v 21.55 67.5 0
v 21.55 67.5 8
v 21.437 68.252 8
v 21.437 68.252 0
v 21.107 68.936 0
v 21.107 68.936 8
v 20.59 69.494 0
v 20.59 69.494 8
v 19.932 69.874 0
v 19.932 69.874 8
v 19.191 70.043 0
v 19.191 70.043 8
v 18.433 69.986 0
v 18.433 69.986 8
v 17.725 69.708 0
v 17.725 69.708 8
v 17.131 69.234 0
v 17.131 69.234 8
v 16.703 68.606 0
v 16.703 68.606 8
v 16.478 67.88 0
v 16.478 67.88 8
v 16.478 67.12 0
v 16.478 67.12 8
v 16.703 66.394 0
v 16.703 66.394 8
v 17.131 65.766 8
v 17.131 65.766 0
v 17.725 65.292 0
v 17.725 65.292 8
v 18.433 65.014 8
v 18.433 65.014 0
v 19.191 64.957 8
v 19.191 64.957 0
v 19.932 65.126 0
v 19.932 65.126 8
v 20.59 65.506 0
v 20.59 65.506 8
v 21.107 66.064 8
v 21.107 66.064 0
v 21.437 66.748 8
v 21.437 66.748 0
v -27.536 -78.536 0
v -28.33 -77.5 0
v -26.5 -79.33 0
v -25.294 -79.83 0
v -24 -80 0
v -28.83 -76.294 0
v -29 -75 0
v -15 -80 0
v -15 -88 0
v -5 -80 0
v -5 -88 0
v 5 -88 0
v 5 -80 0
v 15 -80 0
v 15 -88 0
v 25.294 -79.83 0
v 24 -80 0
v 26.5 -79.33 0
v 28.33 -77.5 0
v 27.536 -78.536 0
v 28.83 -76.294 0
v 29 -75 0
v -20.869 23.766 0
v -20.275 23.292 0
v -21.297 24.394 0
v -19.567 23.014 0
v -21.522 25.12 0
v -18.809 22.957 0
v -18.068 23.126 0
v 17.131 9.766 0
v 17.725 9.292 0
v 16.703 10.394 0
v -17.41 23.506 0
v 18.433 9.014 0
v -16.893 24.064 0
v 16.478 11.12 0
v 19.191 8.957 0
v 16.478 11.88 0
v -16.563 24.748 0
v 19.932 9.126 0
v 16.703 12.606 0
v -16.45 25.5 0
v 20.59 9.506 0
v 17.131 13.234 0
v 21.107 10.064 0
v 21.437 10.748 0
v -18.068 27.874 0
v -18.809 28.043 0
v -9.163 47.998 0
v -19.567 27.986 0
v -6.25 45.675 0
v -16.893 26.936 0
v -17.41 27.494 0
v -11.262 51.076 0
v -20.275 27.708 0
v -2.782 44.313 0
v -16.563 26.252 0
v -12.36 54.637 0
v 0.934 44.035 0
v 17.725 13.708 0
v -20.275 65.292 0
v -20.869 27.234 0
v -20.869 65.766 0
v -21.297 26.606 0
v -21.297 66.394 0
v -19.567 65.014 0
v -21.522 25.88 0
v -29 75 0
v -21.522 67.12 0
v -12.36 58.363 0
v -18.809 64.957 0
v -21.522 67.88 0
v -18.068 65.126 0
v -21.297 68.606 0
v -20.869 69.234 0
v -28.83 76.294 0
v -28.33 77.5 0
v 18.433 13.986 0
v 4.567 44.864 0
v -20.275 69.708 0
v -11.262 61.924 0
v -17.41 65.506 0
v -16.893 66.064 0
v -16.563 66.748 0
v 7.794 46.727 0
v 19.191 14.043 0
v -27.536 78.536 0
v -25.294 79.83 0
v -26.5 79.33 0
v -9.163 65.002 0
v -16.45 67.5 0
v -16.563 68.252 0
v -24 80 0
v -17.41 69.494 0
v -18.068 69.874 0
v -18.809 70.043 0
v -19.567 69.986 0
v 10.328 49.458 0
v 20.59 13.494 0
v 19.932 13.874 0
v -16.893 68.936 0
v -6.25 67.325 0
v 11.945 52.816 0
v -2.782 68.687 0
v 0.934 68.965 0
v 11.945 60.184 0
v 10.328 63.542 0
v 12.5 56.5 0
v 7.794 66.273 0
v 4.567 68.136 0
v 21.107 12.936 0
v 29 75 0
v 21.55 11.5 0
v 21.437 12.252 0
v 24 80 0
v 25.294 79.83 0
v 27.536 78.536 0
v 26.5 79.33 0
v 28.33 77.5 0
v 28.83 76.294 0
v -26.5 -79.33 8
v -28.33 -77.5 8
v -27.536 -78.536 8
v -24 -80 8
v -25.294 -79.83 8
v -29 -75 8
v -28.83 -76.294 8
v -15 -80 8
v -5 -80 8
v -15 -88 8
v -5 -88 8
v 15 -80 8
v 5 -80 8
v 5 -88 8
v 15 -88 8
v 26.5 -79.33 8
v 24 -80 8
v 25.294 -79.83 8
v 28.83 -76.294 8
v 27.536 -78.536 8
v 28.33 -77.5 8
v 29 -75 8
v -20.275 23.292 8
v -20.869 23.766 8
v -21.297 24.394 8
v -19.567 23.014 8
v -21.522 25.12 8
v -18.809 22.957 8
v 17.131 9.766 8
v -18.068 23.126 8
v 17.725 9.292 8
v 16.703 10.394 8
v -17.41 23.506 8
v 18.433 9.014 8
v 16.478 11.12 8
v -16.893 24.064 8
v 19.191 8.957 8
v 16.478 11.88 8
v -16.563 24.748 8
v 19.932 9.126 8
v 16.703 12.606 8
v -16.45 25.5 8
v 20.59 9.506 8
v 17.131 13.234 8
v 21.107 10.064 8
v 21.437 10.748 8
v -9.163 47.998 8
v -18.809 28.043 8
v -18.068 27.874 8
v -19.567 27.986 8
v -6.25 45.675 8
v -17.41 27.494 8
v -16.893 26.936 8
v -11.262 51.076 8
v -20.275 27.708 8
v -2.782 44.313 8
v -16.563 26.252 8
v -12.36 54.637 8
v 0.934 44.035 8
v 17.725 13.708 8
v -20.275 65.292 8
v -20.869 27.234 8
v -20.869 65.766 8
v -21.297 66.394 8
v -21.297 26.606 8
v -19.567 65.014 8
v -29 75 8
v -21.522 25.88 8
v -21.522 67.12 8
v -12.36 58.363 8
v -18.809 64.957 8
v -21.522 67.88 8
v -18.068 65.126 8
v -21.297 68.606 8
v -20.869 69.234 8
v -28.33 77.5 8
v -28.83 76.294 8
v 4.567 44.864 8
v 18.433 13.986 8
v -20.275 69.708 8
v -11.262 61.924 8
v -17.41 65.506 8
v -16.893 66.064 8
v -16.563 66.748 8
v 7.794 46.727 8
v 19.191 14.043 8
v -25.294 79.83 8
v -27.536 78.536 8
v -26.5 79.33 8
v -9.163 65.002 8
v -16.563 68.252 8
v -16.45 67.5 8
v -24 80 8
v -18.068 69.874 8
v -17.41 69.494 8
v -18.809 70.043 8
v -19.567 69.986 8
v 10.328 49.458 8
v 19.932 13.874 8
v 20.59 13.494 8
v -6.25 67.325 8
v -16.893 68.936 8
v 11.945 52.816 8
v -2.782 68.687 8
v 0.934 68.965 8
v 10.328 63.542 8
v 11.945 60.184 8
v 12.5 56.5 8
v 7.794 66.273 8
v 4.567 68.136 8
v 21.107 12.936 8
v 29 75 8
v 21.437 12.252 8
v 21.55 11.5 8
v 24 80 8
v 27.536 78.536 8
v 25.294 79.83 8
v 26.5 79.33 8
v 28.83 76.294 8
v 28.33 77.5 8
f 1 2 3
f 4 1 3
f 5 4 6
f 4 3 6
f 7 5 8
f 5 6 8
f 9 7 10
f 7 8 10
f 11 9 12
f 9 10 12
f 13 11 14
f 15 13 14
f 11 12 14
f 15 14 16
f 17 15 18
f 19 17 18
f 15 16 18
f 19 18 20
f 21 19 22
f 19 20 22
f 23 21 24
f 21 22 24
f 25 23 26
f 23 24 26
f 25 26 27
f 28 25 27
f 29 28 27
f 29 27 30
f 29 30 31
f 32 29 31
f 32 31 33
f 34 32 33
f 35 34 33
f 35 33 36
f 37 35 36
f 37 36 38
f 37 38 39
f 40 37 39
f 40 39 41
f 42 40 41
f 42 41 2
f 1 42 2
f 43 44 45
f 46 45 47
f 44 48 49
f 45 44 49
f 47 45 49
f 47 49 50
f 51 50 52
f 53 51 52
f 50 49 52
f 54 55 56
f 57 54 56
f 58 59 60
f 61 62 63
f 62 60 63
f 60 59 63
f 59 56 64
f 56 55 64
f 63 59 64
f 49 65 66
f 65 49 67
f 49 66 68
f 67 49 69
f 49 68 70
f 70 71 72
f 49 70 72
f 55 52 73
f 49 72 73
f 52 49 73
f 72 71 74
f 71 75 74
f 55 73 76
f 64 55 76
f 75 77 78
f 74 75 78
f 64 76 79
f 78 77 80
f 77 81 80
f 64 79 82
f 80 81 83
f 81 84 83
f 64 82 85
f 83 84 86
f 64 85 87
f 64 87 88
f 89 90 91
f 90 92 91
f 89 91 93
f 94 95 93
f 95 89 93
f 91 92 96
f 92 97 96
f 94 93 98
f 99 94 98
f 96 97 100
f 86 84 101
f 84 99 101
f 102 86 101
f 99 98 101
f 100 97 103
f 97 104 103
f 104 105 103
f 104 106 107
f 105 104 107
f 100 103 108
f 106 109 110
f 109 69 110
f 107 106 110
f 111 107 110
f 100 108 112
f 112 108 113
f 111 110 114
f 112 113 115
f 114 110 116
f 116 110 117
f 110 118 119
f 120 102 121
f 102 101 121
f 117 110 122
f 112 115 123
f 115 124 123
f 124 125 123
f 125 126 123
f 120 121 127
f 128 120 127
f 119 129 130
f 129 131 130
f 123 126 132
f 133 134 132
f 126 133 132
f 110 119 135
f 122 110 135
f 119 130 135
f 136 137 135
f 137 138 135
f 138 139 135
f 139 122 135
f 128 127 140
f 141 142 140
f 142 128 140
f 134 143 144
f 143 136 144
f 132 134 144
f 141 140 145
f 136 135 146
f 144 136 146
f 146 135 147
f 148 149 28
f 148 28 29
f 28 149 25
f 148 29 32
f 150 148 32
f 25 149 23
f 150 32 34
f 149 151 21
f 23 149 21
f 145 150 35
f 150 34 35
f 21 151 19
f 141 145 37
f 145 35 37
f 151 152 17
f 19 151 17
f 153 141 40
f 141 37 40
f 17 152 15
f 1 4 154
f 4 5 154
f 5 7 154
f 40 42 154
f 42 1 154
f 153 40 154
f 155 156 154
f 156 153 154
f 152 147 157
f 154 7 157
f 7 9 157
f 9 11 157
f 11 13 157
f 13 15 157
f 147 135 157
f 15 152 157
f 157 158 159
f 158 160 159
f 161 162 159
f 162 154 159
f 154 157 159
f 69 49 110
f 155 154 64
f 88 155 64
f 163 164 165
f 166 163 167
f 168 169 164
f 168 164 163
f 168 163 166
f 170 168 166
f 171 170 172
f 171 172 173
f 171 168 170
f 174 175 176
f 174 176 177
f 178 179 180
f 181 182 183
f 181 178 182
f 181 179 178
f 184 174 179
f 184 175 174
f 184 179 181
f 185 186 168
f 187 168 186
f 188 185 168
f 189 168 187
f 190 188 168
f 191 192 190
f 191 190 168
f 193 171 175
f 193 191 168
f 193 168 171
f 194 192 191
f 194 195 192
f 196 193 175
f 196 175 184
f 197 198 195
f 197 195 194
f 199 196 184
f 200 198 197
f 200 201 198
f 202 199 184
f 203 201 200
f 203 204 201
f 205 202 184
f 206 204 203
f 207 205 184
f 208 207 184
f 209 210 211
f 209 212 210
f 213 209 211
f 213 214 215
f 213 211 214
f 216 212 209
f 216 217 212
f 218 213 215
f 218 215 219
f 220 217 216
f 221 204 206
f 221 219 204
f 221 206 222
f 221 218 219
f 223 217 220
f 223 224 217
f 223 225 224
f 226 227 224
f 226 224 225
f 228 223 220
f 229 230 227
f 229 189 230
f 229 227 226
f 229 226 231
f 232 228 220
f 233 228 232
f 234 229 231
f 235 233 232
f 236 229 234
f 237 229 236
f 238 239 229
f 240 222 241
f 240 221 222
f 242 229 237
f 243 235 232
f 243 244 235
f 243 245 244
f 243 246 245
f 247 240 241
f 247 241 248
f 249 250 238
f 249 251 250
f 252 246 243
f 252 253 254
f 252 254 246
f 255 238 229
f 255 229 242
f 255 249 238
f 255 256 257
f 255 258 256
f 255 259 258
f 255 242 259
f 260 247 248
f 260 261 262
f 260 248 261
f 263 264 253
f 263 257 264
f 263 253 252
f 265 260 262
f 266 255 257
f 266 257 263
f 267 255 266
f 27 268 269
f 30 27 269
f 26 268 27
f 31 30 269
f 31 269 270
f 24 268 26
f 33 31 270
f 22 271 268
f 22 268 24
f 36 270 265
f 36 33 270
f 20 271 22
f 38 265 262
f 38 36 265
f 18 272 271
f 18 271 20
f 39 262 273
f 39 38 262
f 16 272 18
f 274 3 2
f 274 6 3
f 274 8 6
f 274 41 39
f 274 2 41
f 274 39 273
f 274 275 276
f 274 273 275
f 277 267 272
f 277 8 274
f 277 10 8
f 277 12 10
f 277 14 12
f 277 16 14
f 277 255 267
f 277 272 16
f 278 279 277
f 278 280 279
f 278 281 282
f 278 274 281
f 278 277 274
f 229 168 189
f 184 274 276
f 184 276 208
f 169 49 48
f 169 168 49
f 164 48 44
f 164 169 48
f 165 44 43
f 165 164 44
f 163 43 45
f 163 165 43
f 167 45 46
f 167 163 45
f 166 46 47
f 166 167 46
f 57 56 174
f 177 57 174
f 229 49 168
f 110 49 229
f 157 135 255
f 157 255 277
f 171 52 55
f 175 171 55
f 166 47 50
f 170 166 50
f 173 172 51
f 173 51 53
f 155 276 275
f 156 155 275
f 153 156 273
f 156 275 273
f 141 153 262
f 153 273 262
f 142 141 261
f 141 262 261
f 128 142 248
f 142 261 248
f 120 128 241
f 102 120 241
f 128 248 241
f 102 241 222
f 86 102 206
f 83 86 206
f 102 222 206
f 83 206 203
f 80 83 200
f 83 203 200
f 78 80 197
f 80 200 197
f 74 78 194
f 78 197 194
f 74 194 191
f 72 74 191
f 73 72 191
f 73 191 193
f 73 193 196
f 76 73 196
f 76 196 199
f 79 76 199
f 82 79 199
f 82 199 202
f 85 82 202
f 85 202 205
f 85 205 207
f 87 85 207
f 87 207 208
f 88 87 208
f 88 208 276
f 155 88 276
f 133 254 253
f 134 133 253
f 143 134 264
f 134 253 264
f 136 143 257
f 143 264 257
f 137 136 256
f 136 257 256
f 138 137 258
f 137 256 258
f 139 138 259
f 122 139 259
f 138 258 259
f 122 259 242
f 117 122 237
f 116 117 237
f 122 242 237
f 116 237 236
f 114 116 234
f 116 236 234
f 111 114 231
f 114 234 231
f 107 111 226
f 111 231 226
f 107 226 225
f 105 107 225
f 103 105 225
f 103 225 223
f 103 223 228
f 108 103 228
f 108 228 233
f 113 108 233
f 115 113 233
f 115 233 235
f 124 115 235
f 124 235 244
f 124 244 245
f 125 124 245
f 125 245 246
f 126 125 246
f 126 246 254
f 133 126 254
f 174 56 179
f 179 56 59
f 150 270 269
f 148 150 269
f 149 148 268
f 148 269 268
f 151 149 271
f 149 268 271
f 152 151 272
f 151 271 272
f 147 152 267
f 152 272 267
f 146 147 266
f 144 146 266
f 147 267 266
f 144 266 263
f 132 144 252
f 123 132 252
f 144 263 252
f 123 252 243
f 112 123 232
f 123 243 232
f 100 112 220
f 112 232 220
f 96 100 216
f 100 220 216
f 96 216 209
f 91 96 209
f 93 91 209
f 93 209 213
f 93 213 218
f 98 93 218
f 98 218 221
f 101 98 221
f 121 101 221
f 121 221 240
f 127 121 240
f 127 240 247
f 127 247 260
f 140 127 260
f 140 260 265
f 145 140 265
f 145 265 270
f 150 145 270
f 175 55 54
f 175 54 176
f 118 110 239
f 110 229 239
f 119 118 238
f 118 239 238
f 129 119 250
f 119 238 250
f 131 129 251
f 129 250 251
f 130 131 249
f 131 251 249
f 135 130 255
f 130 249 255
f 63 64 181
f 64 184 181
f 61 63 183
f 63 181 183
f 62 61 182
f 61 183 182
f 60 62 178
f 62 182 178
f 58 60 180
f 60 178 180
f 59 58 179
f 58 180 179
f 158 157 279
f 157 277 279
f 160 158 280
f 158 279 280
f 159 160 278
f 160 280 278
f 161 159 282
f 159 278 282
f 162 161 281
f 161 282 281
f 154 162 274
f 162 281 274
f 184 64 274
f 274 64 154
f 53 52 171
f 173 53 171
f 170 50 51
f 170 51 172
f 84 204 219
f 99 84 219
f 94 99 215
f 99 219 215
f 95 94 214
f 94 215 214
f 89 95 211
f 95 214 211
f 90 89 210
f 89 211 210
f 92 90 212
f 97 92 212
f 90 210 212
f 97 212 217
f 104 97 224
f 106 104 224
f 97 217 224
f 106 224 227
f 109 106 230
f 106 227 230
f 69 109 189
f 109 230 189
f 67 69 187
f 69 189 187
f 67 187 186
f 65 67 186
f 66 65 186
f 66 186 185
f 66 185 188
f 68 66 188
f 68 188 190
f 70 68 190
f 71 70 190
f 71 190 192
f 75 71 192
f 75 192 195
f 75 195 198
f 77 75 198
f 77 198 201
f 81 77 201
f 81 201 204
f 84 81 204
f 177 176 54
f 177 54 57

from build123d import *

# Parameters (mm, degrees)
SKETCH1_W           = 58
SKETCH1_H           = 160
BOSS_EXTRUDE1_DEPTH = 8
SKETCH2_R           = 2.55
SKETCH2_R_2         = 12.5
CUT_EXTRUDE1_DEPTH  = 86.469292731
SKETCH6_W           = 10
SKETCH6_H           = 8
BOSS_EXTRUDE3_DEPTH = 8
FILLET2_R           = 5


with BuildPart() as part:
    # Sketch1 → Boss-Extrude1 (new body)
    with BuildSketch(Plane.XY):
        Rectangle(SKETCH1_W, SKETCH1_H)
    extrude(amount=BOSS_EXTRUDE1_DEPTH)

    # Sketch2 → Cut-Extrude1 (cut, through all)
    with BuildSketch(Plane.XY.offset(8)):
        with Locations((-19, 67.5)):
            Circle(SKETCH2_R)
        with Locations((19, 67.5)):
            Circle(SKETCH2_R)
        with Locations((-19, 25.5)):
            Circle(SKETCH2_R)
        with Locations((19, 11.5)):
            Circle(SKETCH2_R)
        with Locations((0, 56.5)):
            Circle(SKETCH2_R_2)
    extrude(amount=-CUT_EXTRUDE1_DEPTH, mode=Mode.SUBTRACT)

    # Sketch6 → Boss-Extrude3 (add)
    with BuildSketch(Plane.XZ.offset(80)):
        with Locations((-10, 4)):
            Rectangle(SKETCH6_W, SKETCH6_H)
        with Locations((10, 4)):
            Rectangle(SKETCH6_W, SKETCH6_H)
    extrude(amount=BOSS_EXTRUDE3_DEPTH)

    # Fillet2
    fillet2_edges = [part.edges().sort_by_distance(p)[0] for p in [
        (29, 80, 4),
        (-29, 80, 4),
        (29, -80, 4),
        (-29, -80, 4),
    ]]
    fillet(fillet2_edges, radius=FILLET2_R)


solid = part.part
